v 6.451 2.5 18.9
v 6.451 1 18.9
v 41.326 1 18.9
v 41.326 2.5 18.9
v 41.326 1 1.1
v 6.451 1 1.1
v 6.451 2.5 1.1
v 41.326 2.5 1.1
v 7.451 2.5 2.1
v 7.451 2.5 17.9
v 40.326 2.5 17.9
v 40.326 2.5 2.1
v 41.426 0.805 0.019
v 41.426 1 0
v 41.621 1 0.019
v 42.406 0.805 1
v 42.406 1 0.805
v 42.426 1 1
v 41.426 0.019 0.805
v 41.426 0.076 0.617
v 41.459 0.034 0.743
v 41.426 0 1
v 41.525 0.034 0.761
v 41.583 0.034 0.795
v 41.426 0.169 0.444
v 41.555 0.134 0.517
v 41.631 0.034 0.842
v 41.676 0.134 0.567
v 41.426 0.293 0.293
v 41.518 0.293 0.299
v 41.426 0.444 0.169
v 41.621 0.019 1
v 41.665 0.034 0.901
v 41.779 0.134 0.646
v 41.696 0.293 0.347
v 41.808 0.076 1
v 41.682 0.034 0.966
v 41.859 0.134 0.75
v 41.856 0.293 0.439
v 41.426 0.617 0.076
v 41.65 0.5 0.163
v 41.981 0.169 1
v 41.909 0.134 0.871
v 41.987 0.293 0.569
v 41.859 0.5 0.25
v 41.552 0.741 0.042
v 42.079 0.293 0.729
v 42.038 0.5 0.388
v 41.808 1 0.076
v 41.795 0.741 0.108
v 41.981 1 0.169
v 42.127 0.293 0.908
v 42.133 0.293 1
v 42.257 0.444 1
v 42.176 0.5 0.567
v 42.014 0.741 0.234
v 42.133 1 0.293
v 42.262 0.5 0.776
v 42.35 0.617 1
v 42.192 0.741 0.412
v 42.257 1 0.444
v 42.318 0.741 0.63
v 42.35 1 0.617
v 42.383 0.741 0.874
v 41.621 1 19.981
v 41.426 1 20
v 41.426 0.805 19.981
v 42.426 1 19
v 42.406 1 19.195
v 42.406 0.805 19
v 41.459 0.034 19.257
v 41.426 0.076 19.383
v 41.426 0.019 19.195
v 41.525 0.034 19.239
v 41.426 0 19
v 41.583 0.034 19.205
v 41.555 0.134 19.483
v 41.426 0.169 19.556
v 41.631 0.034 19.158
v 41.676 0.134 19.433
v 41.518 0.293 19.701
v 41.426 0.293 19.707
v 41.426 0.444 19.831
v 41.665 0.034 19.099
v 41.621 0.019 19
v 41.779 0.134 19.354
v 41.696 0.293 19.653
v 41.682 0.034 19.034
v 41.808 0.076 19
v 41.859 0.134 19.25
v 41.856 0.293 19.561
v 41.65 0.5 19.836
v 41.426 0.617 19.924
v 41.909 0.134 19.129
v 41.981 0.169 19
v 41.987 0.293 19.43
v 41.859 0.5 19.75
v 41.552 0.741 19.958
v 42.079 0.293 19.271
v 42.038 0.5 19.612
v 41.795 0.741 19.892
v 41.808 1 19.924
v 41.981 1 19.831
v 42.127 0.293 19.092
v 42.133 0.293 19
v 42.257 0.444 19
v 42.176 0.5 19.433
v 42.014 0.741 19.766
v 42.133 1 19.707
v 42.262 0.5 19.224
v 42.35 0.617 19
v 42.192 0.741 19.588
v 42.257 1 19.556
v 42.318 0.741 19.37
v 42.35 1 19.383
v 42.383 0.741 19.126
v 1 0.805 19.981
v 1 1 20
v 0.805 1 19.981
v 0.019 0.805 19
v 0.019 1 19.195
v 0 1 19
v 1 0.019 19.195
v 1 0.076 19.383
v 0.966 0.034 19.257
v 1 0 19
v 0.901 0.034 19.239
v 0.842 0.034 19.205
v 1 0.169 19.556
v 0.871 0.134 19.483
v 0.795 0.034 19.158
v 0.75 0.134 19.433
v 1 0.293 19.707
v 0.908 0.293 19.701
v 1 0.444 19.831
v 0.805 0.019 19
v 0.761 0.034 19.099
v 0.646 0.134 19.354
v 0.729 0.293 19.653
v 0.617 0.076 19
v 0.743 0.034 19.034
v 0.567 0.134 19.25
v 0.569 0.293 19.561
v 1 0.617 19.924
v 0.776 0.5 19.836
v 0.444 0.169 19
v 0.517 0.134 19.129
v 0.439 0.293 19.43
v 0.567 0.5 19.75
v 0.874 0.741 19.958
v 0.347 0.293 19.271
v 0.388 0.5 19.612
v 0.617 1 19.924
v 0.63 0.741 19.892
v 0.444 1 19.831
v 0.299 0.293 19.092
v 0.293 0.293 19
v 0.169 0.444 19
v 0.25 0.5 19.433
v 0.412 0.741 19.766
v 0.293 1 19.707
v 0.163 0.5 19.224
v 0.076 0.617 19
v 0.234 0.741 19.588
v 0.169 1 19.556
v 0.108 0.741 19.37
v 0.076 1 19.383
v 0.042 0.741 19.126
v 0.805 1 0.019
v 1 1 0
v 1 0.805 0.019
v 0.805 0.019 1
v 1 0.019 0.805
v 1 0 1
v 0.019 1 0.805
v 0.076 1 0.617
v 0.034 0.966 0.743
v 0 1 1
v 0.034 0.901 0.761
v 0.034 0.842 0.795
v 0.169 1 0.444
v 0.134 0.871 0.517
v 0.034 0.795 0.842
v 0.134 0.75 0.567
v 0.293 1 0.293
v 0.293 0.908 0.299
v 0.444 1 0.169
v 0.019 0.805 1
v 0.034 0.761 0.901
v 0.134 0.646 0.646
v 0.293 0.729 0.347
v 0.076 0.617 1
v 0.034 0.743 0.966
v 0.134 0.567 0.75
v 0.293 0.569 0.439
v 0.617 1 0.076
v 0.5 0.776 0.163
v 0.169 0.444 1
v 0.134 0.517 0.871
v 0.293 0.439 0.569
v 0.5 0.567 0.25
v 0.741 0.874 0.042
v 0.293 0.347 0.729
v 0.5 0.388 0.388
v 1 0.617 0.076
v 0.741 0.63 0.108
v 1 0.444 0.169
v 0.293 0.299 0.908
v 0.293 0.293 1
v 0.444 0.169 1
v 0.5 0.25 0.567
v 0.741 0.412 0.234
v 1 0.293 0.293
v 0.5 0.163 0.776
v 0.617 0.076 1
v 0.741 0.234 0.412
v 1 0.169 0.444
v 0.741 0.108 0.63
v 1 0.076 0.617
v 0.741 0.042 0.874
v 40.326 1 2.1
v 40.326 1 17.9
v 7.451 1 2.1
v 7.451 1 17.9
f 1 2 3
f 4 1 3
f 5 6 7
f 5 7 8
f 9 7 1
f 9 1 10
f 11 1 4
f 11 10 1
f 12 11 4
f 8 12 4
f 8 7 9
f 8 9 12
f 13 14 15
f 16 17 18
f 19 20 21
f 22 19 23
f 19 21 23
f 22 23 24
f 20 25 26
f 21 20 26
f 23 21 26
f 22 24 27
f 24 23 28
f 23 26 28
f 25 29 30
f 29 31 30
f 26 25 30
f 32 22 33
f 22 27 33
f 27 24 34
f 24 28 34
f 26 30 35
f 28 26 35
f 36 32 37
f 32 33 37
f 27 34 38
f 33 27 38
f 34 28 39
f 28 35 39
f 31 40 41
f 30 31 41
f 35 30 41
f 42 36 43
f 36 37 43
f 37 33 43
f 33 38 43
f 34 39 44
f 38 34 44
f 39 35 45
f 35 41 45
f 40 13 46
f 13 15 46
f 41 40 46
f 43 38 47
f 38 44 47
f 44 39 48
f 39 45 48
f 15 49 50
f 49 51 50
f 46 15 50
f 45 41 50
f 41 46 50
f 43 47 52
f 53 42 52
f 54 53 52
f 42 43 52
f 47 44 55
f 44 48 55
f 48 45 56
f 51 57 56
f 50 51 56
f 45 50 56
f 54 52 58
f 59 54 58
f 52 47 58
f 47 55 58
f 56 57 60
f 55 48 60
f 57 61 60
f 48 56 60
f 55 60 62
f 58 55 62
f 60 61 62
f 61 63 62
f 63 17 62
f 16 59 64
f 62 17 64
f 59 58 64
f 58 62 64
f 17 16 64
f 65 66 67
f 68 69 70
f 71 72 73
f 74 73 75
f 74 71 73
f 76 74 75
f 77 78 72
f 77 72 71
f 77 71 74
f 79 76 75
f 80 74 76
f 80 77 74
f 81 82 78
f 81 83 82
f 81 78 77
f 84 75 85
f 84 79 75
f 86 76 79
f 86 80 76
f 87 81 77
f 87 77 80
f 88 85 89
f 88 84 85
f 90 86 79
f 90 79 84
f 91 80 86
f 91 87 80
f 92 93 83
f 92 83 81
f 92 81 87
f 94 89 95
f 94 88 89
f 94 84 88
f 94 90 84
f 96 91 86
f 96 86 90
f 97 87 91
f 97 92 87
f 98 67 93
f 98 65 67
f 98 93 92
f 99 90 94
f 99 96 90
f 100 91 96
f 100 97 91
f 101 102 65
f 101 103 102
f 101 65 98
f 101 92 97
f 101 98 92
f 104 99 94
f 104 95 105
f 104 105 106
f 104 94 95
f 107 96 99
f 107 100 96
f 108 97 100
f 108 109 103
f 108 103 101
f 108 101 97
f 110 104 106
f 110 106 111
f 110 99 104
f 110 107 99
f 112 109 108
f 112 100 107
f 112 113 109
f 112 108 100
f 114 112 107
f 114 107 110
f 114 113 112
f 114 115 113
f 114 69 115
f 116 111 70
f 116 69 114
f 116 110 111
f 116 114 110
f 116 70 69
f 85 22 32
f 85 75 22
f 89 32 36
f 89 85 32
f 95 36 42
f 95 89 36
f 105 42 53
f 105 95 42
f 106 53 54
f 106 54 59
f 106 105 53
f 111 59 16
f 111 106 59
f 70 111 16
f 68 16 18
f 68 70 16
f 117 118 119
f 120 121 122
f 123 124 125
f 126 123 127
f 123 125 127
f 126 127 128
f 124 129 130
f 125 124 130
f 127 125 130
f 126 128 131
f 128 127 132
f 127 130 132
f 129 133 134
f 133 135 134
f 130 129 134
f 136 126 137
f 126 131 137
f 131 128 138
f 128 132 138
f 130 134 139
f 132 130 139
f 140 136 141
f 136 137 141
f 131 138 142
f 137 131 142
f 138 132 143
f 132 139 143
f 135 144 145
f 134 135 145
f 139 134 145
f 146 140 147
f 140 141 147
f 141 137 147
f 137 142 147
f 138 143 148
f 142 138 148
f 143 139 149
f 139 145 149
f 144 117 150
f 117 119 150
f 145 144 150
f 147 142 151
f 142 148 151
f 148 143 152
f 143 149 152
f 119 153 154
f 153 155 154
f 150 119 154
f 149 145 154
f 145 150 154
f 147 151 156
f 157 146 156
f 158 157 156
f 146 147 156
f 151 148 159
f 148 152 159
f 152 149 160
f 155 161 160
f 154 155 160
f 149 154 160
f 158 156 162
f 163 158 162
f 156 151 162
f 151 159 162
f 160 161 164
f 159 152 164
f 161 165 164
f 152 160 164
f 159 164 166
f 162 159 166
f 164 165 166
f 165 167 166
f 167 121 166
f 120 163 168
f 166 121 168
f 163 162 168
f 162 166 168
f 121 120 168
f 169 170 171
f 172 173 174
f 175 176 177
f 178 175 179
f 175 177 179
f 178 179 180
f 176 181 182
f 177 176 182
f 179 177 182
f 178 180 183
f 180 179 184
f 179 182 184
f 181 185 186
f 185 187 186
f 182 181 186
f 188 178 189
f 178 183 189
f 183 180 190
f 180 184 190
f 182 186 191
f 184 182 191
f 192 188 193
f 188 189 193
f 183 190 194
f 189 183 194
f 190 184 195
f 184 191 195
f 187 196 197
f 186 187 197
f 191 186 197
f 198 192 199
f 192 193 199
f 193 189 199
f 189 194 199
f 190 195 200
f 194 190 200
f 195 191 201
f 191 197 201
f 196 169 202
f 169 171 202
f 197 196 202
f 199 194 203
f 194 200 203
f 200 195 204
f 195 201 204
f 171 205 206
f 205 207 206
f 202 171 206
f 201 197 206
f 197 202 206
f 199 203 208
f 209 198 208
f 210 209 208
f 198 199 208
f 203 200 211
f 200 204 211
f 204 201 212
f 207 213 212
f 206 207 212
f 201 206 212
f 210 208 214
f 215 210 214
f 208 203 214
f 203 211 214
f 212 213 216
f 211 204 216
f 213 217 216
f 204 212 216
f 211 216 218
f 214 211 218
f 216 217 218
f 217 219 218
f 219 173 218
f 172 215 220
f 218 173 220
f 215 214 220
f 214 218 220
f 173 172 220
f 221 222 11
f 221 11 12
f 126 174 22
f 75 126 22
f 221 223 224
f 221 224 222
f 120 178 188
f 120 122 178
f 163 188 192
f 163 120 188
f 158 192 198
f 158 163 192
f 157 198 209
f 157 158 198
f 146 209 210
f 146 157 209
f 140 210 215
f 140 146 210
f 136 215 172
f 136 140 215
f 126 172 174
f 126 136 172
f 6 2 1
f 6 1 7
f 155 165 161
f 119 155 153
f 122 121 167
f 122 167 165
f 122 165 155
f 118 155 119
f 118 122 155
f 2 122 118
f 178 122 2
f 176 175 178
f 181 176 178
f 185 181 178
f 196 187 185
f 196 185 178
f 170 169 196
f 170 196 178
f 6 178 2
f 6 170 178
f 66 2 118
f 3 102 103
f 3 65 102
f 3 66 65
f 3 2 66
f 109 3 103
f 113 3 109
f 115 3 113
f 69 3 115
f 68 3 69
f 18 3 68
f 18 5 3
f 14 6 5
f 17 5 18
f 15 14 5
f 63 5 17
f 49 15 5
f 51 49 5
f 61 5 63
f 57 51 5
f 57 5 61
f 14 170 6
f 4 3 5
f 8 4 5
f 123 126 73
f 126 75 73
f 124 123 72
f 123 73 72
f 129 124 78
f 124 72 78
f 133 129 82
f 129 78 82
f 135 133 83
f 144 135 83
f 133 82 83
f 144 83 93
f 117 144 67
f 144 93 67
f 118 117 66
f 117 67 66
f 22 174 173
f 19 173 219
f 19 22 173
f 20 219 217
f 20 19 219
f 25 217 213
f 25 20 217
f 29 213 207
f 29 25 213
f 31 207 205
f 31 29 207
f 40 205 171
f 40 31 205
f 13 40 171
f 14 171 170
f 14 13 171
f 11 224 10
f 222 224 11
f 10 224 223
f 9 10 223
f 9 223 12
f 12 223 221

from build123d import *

# Parameters (mm, degrees)
SKETCH1_W           = 42.42562
SKETCH1_H           = 1
BOSS_EXTRUDE1_DEPTH = 19.99996
FILLET1_R           = 1
SKETCH2_W           = 34.8742
SKETCH2_H           = 17.79996
SKETCH2_W_2         = 32.8742
SKETCH2_H_2         = 15.79996
BOSS_EXTRUDE2_DEPTH = 1.5


with BuildPart() as part:
    # Sketch1 → Boss-Extrude1 (new body)
    with BuildSketch(Plane.XY):
        with Locations((21.21281, 0.5)):
            Rectangle(SKETCH1_W, SKETCH1_H)
    extrude(amount=BOSS_EXTRUDE1_DEPTH)

    # Fillet1
    fillet1_edges = [part.edges().sort_by_distance(p)[0] for p in [
        (42.42562, 0.5, 19.99996),
        (0, 0.5, 19.99996),
        (42.42562, 0.5, 0),
        (21.21281, 0, 0),
        (0, 0.5, 0),
        (21.21281, 0, 19.99996),
        (42.42562, 0, 9.99998),
        (0, 0, 9.99998),
    ]]
    fillet(fillet1_edges, radius=FILLET1_R - 0.0001)  # a hair under: the kernel refuses the full size

    # Sketch2 → Boss-Extrude2 (add)
    with BuildSketch(Plane(origin=(0, 1, 0), x_dir=(1, 0, 0), z_dir=(0, 1, 0))):
        with Locations((23.88852, -9.99998)):
            Rectangle(SKETCH2_W, SKETCH2_H)
        with Locations((23.88852, -9.99998)):
            Rectangle(SKETCH2_W_2, SKETCH2_H_2, mode=Mode.SUBTRACT)
    extrude(amount=BOSS_EXTRUDE2_DEPTH)


solid = part.part
